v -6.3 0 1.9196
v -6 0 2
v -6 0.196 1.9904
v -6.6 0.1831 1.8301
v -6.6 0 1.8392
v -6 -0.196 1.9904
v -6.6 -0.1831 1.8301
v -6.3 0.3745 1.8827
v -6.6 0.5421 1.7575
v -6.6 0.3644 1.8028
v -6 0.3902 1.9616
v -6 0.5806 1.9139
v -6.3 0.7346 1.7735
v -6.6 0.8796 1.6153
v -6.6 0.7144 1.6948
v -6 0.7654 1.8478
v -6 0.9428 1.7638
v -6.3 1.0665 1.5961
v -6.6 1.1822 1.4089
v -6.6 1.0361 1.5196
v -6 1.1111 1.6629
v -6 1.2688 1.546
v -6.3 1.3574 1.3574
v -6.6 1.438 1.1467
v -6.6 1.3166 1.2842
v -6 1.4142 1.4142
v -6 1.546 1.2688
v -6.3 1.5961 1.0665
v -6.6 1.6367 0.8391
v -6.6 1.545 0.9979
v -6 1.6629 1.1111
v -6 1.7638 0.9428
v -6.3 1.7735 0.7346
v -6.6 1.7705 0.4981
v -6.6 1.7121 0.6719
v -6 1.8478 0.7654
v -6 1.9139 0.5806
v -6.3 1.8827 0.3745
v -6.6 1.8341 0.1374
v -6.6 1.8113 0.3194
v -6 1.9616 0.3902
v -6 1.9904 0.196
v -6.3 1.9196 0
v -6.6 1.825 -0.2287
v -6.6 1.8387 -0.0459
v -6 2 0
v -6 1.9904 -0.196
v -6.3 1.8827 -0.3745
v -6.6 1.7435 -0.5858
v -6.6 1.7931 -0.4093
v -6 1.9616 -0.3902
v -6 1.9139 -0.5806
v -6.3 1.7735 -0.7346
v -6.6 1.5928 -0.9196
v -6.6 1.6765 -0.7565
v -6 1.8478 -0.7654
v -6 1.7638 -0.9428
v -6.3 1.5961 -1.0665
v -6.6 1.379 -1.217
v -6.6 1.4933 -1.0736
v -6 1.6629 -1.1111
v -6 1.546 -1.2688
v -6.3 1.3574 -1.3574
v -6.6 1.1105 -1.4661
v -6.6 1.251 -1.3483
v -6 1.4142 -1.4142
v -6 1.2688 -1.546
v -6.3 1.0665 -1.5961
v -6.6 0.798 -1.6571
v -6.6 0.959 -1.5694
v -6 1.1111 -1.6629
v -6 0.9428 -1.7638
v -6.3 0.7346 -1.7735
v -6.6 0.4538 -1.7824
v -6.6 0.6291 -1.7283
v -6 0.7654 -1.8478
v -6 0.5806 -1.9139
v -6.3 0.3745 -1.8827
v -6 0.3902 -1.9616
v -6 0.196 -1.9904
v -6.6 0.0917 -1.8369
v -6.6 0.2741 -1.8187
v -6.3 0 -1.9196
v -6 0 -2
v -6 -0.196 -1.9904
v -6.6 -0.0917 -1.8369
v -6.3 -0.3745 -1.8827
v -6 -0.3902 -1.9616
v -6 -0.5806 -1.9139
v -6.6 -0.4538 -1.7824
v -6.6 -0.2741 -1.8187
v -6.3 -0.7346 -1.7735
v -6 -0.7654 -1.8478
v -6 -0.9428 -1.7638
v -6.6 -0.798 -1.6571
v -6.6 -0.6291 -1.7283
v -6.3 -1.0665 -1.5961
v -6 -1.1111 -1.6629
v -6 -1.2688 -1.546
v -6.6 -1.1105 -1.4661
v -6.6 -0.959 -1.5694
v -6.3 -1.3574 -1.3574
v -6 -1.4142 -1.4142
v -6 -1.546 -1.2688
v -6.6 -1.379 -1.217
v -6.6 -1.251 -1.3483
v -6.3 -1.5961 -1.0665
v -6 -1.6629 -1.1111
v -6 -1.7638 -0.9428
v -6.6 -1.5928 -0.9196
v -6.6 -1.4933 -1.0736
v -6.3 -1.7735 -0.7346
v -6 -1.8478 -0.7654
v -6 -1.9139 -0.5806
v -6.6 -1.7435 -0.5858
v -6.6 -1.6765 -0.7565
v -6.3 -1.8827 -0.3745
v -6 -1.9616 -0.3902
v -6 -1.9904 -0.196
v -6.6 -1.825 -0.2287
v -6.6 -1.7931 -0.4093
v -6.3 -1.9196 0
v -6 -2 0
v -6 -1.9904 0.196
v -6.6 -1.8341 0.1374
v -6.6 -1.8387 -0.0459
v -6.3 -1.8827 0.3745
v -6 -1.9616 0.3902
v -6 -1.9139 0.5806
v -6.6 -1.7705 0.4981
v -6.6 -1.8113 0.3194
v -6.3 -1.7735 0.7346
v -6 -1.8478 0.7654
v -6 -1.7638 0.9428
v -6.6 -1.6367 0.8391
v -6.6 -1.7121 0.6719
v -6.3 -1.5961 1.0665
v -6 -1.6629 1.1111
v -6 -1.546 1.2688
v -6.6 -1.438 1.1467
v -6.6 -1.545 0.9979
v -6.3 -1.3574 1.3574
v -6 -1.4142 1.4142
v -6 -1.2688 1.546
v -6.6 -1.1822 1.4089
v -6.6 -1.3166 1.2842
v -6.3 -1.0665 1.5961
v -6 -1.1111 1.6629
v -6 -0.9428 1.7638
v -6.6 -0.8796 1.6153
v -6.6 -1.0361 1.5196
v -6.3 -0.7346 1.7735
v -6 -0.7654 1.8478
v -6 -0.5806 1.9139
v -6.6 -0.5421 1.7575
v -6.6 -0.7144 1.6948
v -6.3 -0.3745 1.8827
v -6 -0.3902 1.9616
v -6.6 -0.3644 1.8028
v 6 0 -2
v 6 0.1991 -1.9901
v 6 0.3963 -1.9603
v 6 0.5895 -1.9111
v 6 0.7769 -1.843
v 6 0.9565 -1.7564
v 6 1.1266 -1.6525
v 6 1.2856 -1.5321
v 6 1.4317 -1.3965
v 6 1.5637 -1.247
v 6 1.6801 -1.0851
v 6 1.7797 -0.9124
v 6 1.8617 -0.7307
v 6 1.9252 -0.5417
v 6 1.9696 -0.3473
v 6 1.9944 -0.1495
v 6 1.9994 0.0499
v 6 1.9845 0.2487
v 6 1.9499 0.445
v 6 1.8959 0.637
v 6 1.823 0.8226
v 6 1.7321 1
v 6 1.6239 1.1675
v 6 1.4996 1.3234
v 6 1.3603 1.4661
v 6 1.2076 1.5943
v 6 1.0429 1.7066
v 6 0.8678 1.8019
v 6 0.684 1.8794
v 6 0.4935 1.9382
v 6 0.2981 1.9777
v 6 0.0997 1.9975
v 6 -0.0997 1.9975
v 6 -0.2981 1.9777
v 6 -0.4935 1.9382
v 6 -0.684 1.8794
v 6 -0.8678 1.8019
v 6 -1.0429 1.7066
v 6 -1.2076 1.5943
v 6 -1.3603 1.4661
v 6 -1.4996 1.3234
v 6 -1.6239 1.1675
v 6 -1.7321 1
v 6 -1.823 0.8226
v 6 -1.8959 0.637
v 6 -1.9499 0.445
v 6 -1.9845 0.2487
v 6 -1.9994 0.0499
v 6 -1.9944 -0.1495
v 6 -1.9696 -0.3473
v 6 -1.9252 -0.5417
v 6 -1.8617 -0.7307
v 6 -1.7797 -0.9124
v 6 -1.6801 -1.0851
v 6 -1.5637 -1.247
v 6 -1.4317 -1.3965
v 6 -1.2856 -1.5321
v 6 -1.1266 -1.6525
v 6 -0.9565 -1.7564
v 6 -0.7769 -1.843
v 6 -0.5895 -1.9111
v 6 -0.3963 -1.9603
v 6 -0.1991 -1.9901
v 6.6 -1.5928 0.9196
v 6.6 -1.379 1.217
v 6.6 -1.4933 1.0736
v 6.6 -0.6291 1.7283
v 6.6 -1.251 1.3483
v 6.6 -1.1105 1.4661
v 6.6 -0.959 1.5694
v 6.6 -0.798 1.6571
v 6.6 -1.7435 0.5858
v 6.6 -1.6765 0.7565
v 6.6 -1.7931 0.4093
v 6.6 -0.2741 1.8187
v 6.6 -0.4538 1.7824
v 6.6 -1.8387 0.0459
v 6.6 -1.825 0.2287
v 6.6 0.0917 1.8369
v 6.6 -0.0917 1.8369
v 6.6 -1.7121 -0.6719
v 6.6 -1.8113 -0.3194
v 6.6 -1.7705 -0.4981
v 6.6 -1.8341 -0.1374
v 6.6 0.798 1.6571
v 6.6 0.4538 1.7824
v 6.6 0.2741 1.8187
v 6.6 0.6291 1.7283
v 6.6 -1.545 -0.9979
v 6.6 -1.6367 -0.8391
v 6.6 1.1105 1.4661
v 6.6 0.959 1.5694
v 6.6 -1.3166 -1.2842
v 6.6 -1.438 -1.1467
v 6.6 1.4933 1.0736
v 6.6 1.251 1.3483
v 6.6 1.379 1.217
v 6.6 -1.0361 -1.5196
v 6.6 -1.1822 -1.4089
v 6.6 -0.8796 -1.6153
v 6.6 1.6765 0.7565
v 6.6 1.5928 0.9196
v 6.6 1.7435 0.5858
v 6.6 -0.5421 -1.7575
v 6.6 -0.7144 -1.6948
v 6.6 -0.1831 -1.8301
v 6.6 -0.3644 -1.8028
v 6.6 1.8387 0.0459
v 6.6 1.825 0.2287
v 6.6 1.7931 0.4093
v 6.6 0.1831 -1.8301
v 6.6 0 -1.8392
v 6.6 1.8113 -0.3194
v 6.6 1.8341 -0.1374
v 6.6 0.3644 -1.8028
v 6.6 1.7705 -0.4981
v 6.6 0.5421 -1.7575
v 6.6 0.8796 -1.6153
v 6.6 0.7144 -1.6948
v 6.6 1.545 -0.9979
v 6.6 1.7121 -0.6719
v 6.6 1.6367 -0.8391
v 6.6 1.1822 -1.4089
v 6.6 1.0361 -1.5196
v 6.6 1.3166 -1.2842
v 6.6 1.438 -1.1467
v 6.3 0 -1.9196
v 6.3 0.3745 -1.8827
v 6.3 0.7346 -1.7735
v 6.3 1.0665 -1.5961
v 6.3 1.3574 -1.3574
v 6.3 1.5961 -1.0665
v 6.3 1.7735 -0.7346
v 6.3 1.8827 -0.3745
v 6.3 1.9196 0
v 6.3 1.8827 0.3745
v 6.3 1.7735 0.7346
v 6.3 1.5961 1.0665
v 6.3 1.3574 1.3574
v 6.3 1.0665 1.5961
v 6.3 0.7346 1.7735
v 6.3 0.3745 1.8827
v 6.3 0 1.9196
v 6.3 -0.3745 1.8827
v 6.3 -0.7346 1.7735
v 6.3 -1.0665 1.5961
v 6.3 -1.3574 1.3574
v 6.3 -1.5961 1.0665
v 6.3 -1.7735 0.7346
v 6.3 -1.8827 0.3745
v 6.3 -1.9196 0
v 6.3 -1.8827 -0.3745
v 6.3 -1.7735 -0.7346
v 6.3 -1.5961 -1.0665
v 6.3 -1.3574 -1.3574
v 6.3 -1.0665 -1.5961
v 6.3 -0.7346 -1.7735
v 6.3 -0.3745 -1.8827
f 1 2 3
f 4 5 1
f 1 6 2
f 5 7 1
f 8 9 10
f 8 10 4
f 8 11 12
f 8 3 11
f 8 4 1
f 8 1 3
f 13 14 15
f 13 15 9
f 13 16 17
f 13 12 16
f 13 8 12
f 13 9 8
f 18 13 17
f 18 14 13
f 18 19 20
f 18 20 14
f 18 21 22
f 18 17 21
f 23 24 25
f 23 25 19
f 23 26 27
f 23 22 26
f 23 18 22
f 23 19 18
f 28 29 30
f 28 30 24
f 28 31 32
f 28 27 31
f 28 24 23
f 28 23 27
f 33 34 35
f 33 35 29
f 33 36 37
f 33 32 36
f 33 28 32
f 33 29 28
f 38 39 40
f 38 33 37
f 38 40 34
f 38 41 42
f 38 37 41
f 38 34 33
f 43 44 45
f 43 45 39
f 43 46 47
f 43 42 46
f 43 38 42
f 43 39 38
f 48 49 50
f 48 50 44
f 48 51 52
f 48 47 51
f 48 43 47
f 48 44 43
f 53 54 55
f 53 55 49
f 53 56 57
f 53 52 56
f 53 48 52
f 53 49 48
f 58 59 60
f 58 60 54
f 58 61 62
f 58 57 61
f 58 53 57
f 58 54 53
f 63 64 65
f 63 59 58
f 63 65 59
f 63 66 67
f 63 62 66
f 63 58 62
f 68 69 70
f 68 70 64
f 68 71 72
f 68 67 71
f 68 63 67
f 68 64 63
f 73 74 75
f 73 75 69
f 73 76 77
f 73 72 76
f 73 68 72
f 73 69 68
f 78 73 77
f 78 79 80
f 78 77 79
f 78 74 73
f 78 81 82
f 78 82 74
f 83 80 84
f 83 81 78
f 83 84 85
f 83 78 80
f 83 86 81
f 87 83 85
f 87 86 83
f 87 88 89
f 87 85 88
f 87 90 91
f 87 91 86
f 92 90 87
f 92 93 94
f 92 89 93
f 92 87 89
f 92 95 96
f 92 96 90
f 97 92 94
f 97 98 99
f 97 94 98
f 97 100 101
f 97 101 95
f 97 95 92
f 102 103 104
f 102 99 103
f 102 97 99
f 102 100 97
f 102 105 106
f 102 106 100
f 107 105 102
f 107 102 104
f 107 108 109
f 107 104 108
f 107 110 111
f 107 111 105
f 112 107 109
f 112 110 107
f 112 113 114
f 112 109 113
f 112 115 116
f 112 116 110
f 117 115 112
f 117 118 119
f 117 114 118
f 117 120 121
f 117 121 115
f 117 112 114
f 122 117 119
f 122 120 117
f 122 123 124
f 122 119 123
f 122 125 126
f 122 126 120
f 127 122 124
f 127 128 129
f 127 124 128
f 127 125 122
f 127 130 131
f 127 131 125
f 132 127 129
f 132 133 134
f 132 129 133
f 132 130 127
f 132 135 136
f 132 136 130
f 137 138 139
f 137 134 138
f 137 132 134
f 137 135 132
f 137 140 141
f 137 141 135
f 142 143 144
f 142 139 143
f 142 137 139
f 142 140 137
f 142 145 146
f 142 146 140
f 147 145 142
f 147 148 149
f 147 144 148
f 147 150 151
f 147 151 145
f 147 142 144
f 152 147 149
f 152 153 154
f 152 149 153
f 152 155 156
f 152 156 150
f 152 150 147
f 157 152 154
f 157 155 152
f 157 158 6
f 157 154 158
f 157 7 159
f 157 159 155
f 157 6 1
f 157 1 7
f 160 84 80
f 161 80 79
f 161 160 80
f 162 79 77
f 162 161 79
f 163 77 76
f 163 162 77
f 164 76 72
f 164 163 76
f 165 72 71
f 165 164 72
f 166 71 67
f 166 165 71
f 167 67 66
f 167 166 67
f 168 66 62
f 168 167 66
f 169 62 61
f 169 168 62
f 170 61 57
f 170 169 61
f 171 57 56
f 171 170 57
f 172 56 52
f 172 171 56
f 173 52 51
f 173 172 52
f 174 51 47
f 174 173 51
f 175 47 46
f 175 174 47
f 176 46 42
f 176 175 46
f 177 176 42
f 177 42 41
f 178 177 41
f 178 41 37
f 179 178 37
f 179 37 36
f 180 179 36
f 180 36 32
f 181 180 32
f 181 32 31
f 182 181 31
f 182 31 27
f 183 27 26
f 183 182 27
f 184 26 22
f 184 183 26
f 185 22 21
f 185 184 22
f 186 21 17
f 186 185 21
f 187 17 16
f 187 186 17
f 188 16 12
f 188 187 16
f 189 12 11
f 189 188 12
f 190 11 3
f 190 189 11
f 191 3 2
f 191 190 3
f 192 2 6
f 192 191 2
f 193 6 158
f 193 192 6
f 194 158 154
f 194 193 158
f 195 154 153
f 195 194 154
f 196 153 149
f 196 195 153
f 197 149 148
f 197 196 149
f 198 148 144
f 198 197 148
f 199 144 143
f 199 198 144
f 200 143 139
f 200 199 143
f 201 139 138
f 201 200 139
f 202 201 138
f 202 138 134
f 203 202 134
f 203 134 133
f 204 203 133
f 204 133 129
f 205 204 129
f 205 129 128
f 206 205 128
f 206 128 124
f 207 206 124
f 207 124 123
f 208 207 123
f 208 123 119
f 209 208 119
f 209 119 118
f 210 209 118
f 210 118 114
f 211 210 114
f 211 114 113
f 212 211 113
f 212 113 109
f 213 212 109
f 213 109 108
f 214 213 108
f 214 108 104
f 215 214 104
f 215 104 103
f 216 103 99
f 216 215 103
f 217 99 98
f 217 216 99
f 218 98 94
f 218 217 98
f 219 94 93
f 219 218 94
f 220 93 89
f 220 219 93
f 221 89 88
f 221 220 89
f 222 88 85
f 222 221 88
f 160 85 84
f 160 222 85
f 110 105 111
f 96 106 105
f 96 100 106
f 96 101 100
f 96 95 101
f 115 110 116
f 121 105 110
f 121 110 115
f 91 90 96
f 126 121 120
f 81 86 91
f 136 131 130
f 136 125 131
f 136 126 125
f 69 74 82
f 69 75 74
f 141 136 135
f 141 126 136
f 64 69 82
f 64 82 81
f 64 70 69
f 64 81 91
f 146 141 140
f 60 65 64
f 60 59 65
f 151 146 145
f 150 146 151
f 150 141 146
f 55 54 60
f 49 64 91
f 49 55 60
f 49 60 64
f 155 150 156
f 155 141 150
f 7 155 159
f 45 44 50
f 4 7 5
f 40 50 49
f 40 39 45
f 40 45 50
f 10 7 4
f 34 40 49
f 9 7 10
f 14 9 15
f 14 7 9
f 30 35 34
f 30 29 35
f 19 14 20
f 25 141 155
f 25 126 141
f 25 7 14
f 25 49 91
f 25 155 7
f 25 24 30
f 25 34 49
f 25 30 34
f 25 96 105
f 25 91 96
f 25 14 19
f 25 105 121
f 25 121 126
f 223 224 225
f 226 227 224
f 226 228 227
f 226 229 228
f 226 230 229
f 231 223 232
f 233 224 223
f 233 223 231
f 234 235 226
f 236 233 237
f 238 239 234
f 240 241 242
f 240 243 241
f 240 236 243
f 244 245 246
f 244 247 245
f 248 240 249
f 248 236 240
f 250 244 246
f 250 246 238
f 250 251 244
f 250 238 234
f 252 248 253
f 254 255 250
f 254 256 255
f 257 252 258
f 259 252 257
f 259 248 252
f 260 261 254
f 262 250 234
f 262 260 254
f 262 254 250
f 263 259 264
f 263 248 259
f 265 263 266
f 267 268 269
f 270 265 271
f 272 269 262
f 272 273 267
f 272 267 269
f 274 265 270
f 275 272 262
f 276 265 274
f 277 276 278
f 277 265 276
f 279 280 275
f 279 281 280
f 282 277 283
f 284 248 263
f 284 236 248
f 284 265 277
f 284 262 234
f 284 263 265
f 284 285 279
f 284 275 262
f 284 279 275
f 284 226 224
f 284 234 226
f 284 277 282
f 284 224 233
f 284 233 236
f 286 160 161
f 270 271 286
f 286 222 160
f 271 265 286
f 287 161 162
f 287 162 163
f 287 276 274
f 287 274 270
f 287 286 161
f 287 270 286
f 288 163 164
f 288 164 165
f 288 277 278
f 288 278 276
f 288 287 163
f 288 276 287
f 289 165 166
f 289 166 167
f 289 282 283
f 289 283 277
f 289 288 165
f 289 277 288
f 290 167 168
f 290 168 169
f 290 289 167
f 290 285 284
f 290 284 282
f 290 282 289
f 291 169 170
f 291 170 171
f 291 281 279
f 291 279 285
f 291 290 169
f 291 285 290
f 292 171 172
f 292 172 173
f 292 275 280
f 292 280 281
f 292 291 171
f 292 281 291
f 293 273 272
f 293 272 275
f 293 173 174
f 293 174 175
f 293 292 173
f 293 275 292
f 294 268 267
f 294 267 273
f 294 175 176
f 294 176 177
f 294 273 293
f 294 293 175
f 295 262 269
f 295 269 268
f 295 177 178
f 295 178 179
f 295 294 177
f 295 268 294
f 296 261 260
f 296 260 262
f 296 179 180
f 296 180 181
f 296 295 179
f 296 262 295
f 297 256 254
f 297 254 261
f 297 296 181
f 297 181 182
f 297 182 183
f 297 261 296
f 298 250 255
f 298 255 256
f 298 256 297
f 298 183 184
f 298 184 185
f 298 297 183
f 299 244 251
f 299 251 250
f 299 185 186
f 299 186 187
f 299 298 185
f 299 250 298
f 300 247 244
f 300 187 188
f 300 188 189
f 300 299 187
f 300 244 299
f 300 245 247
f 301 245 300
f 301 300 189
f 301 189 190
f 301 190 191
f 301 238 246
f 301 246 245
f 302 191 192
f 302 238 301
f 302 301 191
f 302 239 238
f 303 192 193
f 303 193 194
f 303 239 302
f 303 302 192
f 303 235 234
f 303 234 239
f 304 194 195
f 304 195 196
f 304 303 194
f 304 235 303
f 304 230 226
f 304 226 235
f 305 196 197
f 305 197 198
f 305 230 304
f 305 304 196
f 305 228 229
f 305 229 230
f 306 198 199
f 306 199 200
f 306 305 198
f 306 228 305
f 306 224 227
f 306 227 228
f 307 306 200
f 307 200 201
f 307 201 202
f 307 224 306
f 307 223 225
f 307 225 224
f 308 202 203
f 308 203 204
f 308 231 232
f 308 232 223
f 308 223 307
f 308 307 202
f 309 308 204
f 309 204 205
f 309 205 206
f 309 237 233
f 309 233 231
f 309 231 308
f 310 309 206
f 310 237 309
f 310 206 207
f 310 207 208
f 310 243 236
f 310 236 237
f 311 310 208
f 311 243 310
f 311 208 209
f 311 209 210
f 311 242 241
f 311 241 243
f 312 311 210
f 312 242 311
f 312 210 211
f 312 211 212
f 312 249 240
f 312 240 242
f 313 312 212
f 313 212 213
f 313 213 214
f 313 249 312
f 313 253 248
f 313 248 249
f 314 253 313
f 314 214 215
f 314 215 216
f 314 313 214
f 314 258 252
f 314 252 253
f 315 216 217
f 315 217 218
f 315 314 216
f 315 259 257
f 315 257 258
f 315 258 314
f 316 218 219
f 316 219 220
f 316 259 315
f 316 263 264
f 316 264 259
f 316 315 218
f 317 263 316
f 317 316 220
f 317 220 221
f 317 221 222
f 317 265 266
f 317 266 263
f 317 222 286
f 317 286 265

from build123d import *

# Parameters (mm, degrees)
SKETCH2_R           = 2
EXTRUDE1_DEPTH      = 6
EXTRUDE1_DEPTH_BACK = 6
SKETCH3_R           = 2
EXTRUDE2_DEPTH      = 0.6
EXTRUDE2_TAPER      = 15
SKETCH4_R           = 2
EXTRUDE3_DEPTH      = 0.6
EXTRUDE3_TAPER      = 15


with BuildPart() as part:
    # Sketch2 → Extrude1 (new body, two sides)
    with BuildSketch(Plane(origin=(0, 0, 0), x_dir=(0, 0, -1), z_dir=(1, 0, 0))) as extrude1_sk:
        Circle(SKETCH2_R)
    extrude(amount=EXTRUDE1_DEPTH)
    extrude(extrude1_sk.sketch, amount=-EXTRUDE1_DEPTH_BACK)

    # Sketch3 → Extrude2 (add)
    with BuildSketch(Plane(origin=(6, 0, 0), x_dir=(0, 0, -1), z_dir=(1, 0, 0))):
        Circle(SKETCH3_R)
    extrude(amount=EXTRUDE2_DEPTH, taper=EXTRUDE2_TAPER)

    # Sketch4 → Extrude3 (add)
    with BuildSketch(Plane.ZY.offset(6)):
        Circle(SKETCH4_R)
    extrude(amount=EXTRUDE3_DEPTH, taper=EXTRUDE3_TAPER)


solid = part.part
